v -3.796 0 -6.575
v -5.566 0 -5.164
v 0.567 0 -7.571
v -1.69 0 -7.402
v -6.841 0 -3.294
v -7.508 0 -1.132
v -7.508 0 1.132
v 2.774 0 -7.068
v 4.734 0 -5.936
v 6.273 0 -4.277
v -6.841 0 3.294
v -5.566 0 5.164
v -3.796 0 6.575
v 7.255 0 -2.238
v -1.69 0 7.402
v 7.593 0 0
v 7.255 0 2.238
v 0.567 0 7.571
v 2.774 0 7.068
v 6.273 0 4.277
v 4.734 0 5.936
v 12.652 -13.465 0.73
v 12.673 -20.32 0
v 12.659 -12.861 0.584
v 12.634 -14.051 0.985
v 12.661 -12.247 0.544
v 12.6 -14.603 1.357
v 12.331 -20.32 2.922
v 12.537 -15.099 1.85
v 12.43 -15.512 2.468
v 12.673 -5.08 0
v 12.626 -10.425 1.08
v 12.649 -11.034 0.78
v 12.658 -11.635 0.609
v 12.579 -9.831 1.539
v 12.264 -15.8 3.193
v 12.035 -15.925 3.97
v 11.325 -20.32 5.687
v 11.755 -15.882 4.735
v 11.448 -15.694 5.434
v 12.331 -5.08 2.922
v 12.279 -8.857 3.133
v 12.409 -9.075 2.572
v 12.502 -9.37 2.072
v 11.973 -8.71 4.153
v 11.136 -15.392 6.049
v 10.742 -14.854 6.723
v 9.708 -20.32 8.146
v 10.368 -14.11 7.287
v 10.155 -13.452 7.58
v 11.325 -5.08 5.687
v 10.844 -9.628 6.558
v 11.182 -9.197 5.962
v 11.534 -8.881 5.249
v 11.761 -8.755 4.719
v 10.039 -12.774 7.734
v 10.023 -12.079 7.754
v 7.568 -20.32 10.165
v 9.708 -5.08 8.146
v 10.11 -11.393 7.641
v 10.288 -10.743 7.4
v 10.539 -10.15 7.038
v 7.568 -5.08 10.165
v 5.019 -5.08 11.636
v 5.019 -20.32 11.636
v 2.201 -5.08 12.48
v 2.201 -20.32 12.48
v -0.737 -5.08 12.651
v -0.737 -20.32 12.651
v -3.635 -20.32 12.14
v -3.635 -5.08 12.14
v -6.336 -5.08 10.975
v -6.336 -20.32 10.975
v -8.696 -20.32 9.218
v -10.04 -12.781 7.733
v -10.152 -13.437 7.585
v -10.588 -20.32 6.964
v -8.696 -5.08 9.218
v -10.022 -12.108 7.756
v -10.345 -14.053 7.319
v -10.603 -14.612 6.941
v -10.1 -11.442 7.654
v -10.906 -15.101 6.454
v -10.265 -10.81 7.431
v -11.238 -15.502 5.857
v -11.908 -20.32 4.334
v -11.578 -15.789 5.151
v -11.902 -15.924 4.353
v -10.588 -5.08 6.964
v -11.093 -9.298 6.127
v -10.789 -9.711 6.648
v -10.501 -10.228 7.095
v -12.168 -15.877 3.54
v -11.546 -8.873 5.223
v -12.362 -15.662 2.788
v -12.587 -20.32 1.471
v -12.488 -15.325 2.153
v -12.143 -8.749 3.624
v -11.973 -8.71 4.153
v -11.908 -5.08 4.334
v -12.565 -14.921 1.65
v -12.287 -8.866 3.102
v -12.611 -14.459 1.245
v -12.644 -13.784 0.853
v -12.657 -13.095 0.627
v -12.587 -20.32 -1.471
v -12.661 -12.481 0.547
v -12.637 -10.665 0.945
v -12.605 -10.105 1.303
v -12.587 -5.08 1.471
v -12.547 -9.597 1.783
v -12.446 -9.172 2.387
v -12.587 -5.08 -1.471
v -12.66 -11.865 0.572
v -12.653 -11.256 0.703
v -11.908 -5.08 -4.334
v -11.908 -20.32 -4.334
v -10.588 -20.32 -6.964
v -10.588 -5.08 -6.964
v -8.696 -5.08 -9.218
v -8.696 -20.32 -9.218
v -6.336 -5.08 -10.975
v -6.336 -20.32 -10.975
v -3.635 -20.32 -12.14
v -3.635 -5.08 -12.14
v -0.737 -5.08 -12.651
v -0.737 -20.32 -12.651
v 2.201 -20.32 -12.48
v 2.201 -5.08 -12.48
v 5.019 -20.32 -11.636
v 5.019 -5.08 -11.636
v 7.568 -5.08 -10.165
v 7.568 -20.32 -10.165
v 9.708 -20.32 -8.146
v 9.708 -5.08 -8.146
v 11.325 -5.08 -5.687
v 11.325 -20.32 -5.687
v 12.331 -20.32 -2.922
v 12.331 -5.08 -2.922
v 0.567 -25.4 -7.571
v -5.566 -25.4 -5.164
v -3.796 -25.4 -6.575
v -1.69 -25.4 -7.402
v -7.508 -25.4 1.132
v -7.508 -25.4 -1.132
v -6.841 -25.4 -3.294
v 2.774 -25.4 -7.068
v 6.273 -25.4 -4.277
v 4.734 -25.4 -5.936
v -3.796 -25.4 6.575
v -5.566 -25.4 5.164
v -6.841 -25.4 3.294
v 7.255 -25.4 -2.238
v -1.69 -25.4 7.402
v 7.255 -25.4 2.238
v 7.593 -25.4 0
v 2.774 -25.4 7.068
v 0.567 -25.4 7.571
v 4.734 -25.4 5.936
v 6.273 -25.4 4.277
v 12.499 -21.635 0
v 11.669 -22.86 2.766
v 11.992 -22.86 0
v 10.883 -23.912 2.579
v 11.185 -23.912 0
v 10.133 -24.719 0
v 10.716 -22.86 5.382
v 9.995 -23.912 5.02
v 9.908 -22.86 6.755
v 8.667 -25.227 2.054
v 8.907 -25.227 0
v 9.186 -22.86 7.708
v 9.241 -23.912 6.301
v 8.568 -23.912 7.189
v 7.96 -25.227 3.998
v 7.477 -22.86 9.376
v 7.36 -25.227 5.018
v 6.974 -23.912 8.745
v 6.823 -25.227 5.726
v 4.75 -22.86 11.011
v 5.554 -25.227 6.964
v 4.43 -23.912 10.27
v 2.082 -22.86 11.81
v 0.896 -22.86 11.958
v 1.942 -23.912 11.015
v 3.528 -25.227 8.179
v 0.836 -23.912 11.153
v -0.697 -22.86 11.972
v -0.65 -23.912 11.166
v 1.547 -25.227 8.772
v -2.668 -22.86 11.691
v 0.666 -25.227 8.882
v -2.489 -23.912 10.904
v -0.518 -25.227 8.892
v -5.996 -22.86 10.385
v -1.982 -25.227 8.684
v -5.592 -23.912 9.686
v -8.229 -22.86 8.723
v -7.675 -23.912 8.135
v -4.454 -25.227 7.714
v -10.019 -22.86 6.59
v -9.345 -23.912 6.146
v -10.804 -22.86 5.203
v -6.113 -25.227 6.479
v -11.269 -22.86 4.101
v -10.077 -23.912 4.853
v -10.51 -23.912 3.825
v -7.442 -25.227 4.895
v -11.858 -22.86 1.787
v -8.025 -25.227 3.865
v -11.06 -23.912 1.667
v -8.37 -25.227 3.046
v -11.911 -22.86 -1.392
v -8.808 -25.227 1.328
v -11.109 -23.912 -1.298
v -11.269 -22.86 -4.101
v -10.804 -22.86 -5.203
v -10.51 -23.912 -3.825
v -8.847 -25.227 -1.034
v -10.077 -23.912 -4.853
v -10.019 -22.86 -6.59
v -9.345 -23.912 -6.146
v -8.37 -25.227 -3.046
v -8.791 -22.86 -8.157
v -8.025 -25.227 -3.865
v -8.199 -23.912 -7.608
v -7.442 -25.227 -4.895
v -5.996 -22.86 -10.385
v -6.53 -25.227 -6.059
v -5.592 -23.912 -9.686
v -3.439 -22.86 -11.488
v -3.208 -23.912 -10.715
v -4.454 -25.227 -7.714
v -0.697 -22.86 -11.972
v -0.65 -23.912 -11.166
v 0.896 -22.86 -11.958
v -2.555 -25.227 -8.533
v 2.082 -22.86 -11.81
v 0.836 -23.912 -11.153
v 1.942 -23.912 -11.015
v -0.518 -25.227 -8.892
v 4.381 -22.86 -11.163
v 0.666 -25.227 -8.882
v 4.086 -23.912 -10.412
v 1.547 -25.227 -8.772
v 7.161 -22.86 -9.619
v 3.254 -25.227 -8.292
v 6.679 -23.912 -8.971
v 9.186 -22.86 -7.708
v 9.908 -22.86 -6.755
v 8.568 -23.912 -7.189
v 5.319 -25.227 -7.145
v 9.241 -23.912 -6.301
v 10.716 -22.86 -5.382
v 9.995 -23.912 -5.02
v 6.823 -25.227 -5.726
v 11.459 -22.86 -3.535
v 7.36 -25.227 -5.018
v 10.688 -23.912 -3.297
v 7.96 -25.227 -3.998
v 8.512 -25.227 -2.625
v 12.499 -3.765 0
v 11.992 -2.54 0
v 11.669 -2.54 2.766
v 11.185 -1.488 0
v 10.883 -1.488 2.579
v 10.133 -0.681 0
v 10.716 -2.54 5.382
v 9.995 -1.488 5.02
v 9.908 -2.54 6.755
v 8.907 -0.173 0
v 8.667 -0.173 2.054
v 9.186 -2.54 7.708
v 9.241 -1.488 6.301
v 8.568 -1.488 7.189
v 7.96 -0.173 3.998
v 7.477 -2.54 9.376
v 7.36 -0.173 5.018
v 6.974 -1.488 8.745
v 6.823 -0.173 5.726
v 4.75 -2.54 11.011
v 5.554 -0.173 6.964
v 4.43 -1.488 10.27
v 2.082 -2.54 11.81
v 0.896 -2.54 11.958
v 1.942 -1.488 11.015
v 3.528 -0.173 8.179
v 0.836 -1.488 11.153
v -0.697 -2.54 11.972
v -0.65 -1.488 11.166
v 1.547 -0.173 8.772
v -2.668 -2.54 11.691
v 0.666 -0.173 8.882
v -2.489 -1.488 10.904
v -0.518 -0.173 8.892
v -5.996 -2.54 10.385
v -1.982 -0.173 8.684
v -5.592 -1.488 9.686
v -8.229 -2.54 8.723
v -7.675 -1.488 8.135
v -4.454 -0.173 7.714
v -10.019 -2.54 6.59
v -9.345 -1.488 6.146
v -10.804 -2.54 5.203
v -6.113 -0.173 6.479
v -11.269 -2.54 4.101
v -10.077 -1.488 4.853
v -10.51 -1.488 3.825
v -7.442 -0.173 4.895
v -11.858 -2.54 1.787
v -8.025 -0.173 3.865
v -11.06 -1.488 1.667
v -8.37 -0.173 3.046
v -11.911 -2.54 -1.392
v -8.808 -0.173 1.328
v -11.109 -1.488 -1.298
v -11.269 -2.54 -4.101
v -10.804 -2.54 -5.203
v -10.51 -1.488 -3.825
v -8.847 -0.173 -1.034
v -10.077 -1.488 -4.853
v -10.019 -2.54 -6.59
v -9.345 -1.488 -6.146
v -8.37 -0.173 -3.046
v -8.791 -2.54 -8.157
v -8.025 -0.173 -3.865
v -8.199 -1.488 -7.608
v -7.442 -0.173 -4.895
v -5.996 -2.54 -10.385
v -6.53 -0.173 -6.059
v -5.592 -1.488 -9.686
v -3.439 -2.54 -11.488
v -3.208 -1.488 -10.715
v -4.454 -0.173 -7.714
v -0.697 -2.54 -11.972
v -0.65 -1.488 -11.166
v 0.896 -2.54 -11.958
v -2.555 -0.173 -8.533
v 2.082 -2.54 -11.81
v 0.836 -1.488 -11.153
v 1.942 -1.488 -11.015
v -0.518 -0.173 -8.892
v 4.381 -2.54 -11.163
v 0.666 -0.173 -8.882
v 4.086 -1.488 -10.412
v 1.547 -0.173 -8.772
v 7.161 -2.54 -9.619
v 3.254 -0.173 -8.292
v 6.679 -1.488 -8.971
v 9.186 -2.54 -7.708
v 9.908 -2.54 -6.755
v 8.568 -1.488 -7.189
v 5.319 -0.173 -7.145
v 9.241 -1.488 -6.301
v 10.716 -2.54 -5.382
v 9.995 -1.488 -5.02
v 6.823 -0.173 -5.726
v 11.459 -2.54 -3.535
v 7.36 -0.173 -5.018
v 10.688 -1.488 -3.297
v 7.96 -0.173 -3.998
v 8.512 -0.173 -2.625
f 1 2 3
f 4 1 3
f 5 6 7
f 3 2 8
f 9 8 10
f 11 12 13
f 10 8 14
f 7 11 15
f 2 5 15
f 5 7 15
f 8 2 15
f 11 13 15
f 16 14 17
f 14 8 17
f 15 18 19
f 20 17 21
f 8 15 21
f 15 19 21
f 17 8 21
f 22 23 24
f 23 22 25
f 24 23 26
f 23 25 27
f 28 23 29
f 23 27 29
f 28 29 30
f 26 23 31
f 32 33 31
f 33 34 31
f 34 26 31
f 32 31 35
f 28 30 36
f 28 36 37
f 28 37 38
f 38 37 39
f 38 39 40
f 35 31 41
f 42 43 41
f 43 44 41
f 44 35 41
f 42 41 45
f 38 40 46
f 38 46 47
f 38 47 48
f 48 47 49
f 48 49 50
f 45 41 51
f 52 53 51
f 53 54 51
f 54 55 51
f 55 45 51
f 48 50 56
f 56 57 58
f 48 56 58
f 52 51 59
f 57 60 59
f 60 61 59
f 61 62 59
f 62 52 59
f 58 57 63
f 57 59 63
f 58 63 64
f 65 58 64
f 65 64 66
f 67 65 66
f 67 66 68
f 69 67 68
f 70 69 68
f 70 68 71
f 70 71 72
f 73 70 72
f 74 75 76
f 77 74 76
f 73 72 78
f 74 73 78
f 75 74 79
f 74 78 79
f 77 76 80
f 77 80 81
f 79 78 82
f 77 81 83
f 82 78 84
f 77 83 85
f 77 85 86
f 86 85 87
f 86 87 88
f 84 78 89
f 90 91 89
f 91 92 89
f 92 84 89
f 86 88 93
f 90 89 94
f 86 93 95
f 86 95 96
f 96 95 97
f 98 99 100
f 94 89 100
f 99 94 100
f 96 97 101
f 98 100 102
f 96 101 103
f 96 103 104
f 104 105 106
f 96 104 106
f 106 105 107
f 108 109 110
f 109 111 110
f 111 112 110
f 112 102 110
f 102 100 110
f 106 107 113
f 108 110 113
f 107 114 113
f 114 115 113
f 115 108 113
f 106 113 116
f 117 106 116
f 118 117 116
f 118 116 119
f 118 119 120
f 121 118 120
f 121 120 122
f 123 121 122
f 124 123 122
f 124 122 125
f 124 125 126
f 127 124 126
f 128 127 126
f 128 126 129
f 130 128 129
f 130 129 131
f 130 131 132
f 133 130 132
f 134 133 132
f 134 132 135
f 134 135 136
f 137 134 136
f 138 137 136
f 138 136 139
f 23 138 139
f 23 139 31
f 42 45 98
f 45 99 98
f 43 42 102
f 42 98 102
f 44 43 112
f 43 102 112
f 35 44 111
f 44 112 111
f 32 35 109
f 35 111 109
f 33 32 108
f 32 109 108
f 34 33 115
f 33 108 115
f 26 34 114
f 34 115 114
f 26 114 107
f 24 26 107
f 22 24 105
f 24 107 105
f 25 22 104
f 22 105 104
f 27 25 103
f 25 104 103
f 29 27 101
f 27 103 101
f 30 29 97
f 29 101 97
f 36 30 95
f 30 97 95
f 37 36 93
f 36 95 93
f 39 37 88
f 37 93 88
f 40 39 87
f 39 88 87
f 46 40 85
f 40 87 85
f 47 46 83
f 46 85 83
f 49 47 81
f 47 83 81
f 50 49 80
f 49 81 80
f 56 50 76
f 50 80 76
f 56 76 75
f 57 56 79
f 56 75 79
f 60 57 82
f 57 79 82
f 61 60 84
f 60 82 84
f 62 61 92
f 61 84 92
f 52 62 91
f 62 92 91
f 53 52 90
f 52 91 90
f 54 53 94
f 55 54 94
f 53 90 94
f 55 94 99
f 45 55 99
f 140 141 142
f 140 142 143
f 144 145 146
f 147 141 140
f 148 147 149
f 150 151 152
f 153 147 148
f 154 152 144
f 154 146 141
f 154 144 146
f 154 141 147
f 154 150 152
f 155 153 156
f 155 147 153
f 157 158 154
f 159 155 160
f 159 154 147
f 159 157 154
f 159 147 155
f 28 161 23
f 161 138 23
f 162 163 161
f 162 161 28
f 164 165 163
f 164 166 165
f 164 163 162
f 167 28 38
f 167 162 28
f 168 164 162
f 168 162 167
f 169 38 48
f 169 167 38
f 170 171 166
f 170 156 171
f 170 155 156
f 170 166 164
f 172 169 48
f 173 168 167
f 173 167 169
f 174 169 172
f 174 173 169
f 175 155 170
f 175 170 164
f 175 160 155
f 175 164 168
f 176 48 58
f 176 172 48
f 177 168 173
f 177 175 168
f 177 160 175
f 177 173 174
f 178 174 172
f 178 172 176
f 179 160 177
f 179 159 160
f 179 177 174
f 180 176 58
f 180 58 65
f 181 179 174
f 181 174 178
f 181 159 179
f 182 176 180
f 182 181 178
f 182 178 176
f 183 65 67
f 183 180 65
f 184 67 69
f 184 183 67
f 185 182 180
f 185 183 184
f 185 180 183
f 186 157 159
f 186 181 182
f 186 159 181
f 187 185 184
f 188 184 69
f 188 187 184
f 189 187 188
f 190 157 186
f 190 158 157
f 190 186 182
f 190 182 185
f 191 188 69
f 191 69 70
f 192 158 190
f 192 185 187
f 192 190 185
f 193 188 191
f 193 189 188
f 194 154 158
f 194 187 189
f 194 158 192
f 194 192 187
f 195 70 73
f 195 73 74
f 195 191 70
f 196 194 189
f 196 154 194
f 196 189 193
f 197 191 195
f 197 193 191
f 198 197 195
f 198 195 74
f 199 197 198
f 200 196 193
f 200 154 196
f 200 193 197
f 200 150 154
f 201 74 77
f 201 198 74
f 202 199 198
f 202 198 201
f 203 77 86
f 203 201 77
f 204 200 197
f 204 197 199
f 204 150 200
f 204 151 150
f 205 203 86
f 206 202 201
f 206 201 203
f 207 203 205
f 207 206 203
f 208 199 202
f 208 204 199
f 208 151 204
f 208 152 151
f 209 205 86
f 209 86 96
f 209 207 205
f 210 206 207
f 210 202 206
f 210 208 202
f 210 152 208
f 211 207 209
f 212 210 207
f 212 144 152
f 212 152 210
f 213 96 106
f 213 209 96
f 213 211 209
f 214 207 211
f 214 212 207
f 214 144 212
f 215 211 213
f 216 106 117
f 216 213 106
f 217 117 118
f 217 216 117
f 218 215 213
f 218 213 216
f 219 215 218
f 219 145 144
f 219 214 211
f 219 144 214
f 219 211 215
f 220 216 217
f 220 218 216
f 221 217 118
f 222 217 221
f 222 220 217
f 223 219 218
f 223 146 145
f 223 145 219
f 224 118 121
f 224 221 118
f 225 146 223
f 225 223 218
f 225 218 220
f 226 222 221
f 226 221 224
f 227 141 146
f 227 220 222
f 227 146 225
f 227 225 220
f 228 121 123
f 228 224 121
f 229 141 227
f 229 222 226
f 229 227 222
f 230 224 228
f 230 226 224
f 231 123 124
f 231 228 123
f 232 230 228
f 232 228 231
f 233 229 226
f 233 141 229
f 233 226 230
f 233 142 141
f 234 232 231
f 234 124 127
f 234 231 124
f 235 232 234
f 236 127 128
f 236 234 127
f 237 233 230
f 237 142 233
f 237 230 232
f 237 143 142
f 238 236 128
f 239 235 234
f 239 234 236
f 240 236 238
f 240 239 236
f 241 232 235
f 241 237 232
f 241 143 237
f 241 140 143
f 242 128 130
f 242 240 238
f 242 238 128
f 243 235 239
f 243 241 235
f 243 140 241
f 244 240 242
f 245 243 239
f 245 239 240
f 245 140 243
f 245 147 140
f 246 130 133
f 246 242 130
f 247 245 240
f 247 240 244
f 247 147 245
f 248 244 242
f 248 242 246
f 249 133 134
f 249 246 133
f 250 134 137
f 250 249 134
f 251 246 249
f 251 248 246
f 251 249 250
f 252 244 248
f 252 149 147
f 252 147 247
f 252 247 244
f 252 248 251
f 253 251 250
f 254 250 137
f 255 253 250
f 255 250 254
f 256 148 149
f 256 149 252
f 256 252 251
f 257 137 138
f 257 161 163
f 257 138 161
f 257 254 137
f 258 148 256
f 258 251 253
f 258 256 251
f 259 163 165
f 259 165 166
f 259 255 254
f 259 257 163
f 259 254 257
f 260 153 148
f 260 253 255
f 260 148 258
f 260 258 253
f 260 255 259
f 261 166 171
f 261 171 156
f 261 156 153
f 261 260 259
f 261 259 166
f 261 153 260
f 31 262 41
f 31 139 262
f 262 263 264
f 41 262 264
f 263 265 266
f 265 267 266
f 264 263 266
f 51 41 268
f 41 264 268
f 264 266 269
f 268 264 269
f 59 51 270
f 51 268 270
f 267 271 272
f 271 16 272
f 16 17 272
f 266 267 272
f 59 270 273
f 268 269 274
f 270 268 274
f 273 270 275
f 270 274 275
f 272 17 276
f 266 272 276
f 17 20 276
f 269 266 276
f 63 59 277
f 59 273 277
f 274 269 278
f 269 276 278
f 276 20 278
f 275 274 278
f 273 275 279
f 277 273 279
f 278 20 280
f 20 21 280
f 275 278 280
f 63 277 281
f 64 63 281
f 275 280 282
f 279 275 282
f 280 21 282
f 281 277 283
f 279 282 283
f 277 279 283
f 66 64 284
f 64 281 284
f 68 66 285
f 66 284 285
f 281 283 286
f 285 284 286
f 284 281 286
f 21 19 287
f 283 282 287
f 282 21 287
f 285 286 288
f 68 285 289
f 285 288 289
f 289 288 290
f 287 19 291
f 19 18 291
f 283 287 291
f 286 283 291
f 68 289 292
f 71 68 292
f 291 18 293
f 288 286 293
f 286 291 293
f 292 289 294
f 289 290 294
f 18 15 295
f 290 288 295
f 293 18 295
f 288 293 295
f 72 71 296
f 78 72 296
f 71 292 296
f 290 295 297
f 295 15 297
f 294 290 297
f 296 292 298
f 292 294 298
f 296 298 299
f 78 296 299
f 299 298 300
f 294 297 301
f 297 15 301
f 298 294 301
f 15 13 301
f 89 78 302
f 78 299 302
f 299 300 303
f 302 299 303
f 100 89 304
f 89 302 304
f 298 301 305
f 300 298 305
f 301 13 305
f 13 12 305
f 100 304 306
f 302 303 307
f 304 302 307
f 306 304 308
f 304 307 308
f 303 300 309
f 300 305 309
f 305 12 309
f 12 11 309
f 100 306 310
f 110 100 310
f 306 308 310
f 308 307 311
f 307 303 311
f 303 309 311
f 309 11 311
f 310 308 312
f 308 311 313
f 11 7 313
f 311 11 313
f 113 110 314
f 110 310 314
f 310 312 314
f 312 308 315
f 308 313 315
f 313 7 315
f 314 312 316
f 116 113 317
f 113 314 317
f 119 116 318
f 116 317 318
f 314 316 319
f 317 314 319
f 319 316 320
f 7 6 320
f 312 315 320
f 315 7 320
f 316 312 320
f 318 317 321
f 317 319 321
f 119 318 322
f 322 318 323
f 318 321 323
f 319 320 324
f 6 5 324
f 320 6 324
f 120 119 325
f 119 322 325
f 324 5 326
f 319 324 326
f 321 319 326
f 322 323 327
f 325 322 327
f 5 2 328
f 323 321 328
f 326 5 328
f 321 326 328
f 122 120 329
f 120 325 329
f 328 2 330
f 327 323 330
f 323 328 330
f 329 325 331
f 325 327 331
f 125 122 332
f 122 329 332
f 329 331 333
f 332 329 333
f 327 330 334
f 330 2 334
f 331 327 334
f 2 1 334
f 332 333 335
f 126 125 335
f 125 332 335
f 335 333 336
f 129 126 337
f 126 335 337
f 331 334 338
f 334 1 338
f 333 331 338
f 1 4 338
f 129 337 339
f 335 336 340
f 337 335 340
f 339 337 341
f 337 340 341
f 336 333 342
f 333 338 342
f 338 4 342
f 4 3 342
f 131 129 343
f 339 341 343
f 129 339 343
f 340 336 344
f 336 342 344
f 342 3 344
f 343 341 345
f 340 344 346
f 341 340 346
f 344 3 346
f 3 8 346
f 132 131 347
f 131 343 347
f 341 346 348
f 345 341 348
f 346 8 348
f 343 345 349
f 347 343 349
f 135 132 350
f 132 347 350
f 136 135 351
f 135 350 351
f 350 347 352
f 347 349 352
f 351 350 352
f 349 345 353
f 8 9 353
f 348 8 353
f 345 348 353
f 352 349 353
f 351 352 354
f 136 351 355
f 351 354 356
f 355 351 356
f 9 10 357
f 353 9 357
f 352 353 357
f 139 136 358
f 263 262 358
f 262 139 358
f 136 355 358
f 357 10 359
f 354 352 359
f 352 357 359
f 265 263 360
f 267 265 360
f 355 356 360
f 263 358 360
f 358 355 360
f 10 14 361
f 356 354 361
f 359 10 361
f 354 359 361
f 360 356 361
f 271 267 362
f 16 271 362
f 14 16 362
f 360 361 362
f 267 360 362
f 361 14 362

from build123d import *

# Parameters (mm, degrees)
F0_R      = 12.672559
F1_DEPTH  = 25.4
F2_R      = 5.08
F3_R      = 5.08
F4_R      = 3.609699
F5_DEPTH  = 50.8
F5_FACE_R = 3.609699
F6_DEPTH  = 101.6


with BuildPart() as f1:
    # F0 (on Front) → F1 (new body)
    with BuildSketch(Plane.XZ):
        Circle(F0_R)
    extrude(amount=F1_DEPTH)

    # F2
    f2_edges = [f1.edges().sort_by_distance(p)[0] for p in [
        (-12.672559, -25.4, 0),
    ]]
    fillet(f2_edges, radius=F2_R)

    # F3
    f3_edges = [f1.edges().sort_by_distance(p)[0] for p in [
        (-12.672559, 0, 0),
    ]]
    fillet(f3_edges, radius=F3_R)

    # F4 (on Right) → F5 (cut)
    with BuildSketch(Plane.YZ):
        with Locations((-12.31988, 4.152768)):
            Circle(F4_R)
    extrude(amount=-F5_DEPTH, mode=Mode.SUBTRACT)

    # F5_face (on face) → F6 (cut)
    with BuildSketch(Plane(origin=(0, -12.31988, 4.152768), x_dir=(0, 1, 0), z_dir=(-1, 0, 0))):
        Circle(F5_FACE_R)
    extrude(amount=-F6_DEPTH, mode=Mode.SUBTRACT)


solid = f1.part
